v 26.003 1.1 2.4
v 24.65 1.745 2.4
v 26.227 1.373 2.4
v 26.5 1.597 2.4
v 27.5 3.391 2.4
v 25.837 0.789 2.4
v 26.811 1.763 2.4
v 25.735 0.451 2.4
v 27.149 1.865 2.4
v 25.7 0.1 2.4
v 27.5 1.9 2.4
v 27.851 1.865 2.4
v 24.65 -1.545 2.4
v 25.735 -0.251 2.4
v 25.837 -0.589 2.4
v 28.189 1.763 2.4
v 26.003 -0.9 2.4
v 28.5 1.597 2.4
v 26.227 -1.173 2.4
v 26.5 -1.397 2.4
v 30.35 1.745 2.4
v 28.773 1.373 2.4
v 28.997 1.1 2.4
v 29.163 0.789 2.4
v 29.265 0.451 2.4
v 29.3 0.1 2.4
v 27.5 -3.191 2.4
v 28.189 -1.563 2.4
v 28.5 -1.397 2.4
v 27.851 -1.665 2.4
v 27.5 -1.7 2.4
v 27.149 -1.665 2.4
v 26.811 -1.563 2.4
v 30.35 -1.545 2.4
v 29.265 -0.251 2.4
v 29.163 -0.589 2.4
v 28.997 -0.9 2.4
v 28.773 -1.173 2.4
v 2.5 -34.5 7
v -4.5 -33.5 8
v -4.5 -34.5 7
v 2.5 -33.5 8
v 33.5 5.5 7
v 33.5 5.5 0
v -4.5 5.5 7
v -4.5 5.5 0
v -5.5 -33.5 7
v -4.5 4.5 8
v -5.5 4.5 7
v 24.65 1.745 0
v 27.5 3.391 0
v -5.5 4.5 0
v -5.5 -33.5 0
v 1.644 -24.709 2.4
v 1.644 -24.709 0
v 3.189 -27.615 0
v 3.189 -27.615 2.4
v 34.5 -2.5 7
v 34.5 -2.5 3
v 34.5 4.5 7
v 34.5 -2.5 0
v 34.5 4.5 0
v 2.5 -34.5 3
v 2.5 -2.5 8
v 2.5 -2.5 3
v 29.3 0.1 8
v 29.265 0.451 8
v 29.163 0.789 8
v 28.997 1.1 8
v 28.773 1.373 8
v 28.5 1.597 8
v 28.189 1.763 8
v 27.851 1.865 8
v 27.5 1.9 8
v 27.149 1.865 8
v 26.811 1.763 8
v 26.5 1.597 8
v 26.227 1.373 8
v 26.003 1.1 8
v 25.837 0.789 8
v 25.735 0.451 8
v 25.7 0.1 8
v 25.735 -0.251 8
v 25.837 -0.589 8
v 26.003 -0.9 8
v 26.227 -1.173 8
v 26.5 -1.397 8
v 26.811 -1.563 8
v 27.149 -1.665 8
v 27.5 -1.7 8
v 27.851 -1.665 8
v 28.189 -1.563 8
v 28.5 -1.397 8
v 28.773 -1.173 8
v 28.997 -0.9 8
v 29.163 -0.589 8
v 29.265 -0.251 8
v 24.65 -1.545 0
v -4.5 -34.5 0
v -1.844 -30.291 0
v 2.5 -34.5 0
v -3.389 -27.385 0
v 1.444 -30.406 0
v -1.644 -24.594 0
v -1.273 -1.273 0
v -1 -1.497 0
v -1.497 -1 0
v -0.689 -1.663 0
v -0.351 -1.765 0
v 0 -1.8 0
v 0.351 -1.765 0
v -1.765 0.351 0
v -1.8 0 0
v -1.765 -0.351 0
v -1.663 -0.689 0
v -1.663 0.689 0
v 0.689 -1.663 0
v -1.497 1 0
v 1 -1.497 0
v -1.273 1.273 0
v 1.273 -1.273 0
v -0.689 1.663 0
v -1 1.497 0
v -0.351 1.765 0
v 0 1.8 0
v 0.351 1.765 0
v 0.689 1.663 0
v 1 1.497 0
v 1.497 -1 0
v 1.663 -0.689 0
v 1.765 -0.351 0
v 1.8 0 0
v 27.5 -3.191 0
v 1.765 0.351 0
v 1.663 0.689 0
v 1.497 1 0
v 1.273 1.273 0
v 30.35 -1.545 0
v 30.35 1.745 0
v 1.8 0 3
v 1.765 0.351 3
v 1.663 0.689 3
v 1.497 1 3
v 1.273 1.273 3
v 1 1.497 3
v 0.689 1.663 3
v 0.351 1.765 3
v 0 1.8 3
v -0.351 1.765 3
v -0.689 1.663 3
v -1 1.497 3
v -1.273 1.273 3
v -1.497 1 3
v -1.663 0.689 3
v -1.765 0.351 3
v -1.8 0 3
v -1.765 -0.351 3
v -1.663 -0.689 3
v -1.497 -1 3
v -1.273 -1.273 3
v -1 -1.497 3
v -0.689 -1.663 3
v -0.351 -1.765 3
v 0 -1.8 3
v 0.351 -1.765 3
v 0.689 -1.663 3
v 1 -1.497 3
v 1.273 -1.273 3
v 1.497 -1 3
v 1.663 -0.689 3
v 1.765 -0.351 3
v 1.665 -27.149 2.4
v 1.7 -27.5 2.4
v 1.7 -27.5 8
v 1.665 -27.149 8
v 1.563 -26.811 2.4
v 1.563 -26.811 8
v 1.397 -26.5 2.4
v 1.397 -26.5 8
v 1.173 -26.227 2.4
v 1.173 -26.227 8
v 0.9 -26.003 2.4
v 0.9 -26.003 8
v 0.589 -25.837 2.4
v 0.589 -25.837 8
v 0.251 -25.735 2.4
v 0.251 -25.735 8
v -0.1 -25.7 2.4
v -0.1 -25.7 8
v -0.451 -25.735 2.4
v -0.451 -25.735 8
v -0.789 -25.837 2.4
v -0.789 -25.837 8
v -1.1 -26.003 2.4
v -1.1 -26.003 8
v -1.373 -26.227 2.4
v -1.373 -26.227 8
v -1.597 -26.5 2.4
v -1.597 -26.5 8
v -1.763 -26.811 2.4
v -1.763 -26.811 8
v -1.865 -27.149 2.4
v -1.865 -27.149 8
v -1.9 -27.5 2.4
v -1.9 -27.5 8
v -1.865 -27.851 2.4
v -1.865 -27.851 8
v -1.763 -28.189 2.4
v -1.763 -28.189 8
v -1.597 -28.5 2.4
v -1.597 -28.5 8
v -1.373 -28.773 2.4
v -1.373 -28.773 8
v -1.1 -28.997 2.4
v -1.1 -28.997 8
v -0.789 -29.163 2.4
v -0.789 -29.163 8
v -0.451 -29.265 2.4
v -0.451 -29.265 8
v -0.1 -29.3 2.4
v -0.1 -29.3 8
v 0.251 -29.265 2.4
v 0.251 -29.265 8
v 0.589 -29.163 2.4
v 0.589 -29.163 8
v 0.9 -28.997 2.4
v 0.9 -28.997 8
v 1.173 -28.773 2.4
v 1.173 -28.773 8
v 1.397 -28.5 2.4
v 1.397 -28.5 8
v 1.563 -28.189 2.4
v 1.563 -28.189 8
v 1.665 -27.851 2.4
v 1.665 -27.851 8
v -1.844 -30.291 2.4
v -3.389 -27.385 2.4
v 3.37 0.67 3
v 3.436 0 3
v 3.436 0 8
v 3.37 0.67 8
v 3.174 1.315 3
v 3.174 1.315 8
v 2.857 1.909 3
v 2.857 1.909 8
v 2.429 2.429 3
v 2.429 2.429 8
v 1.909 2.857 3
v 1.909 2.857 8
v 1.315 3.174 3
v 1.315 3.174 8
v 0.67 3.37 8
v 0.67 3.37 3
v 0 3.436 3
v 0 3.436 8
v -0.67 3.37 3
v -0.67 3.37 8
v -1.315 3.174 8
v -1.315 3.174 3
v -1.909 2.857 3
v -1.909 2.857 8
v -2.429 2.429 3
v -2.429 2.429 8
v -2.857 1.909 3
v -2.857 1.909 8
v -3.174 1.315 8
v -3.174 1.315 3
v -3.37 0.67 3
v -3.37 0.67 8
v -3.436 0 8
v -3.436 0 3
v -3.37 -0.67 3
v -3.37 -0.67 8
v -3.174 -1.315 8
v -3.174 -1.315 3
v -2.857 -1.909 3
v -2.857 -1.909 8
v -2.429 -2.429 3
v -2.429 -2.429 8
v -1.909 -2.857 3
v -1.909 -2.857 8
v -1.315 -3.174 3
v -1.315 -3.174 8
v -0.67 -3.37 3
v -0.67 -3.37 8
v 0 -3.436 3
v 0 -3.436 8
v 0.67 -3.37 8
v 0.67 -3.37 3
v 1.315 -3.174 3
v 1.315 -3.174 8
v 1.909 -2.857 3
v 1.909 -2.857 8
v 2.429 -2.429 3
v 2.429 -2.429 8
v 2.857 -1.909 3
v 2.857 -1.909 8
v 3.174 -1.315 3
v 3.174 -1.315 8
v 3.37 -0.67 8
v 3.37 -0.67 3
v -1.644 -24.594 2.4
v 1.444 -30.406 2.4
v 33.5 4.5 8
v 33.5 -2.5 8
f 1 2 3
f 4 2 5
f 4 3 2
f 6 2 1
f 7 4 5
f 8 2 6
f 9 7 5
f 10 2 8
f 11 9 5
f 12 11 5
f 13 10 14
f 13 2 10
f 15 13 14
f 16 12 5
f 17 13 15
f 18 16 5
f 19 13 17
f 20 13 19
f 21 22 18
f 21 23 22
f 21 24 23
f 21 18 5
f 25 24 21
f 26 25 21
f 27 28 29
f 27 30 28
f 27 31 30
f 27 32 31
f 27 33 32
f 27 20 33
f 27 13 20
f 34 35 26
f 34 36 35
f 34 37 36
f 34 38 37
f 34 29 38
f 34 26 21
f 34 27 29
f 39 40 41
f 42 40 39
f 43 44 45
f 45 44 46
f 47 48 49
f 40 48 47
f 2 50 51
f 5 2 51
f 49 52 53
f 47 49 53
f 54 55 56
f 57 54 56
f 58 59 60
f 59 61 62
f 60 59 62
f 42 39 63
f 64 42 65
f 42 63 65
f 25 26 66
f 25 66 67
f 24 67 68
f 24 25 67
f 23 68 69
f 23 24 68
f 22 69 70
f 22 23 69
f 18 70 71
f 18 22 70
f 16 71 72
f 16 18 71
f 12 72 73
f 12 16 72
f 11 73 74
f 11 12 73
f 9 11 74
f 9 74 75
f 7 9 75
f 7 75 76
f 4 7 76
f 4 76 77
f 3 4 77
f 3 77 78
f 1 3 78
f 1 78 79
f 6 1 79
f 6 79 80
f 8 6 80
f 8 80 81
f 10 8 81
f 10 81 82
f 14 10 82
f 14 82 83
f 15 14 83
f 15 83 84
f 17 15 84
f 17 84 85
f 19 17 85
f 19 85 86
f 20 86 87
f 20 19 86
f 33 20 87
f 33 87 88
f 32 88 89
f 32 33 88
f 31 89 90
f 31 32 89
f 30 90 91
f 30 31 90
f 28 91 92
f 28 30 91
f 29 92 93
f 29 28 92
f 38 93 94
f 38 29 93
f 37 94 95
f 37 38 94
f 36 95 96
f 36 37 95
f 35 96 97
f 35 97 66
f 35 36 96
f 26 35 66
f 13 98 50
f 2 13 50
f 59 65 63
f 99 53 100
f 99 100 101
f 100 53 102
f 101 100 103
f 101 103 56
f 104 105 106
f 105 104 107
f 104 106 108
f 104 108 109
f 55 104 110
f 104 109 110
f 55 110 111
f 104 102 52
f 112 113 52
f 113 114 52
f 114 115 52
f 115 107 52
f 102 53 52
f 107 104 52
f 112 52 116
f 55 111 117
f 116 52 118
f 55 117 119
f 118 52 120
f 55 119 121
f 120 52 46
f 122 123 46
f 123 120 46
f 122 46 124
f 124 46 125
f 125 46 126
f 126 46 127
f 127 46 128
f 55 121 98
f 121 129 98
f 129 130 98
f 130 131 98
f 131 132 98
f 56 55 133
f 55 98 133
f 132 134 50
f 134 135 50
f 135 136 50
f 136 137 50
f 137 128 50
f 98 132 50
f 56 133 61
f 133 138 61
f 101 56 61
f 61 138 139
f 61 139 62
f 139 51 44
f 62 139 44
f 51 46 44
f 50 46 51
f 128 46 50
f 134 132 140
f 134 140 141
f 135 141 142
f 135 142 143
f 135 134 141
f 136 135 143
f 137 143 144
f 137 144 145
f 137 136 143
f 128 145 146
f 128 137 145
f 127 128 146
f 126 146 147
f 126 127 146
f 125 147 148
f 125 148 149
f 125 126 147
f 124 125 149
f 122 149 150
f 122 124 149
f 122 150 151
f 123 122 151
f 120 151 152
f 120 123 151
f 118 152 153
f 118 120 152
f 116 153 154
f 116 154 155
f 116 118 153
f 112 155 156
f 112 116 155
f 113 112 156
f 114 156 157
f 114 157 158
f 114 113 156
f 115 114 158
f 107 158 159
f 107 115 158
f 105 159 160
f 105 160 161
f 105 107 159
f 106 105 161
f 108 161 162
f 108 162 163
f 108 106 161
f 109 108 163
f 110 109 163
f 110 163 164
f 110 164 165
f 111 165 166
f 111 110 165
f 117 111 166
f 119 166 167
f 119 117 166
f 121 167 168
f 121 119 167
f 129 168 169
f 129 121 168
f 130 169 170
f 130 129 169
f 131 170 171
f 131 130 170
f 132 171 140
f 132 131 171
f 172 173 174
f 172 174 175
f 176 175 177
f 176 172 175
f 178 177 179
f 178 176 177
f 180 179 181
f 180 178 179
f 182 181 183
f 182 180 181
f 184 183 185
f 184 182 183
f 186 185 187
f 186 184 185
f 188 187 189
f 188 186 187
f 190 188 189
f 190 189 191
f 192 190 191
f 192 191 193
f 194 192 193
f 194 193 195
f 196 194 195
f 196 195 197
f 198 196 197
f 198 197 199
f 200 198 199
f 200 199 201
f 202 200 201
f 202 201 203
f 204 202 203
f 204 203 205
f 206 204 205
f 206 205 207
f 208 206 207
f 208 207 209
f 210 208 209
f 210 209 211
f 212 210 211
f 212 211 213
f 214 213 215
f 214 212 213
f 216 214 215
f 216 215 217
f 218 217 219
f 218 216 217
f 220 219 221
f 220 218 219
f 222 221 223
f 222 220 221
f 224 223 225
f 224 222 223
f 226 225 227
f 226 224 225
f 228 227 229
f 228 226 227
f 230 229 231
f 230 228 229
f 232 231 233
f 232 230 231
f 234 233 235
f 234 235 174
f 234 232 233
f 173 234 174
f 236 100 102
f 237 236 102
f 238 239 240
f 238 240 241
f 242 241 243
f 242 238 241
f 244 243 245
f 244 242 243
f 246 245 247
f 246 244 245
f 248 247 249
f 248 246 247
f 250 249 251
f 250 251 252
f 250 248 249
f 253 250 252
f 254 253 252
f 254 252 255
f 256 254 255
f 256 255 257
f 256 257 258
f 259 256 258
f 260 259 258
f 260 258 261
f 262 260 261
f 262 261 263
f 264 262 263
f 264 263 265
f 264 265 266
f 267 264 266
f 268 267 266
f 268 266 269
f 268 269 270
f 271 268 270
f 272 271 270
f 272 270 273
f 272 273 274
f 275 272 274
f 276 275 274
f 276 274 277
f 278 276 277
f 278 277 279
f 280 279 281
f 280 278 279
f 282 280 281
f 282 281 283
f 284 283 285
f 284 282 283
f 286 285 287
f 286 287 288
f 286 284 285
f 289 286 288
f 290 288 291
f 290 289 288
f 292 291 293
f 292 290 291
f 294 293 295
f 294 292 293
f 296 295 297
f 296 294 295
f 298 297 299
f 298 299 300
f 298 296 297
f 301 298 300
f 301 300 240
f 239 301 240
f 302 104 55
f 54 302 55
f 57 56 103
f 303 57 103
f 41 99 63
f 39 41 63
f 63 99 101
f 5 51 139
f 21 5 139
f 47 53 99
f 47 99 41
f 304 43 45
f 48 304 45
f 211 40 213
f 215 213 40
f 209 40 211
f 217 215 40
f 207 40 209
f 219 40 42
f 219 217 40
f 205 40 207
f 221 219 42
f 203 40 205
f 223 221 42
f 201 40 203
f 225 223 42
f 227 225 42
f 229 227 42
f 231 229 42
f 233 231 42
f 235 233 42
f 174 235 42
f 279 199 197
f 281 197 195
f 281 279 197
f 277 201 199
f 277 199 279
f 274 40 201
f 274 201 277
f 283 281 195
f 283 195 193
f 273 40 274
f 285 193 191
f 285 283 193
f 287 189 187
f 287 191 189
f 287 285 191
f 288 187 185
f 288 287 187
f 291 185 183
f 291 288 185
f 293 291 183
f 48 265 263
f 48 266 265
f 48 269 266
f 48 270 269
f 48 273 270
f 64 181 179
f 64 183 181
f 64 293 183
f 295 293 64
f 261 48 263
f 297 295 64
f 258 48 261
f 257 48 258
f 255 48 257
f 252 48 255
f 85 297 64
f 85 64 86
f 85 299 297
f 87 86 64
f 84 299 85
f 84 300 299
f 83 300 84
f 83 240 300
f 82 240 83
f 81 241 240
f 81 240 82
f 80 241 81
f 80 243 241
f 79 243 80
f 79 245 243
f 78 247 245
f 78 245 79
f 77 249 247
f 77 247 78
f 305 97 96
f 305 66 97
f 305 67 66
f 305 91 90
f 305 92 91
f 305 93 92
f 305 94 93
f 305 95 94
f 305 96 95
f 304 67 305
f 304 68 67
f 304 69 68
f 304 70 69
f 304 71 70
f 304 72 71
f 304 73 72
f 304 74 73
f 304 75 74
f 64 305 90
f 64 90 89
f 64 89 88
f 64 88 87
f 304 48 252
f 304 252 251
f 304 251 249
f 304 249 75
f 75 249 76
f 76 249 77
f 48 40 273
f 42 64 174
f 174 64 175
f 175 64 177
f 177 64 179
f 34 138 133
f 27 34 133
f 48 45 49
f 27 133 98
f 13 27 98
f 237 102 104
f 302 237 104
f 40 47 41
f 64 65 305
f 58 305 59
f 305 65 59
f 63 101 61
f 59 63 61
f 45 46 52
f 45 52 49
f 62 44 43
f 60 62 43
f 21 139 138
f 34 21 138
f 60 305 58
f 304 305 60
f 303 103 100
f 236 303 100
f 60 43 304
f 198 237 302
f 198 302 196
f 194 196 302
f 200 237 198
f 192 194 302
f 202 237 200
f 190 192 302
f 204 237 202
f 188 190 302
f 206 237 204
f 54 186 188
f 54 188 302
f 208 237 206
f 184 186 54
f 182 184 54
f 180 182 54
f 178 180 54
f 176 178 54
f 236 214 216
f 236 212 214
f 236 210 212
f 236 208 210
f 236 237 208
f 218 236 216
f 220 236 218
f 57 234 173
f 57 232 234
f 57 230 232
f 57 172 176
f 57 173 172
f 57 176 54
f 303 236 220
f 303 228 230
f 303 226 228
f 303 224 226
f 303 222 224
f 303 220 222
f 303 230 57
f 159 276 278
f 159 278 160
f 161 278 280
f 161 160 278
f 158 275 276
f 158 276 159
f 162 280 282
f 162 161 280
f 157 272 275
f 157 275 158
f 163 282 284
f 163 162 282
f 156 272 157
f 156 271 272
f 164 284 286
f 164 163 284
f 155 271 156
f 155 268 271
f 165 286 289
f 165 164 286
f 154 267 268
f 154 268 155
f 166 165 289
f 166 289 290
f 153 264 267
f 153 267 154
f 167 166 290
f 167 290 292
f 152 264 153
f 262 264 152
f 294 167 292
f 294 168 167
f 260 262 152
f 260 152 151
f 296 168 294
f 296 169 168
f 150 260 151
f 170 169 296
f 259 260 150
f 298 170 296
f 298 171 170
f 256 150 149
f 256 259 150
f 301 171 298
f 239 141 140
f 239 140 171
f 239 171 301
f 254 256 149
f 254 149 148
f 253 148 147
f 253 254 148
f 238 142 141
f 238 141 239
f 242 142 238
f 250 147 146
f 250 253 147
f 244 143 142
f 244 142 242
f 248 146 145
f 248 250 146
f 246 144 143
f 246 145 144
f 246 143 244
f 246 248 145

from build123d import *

# Parameters (mm, degrees)
F0_R     = 1.8
F0_R_2   = 3.435534
F1_DEPTH = 8
F2_DEPTH = 3
F3_R     = 1.8
F4_DEPTH = 2.4
F5_SIZE  = 1


with BuildPart() as f1:
    # F0 (on Top) → F1 (new body)
    with BuildSketch(Plane.XY):
        Polygon((34.5, 5.5), (-5.5, 5.5), (-5.5, -34.5), (2.5, -34.5), (2.5, -2.5), (34.5, -2.5), align=None)
        with Locations((-0.1, -27.5)):
            Circle(F0_R, mode=Mode.SUBTRACT)
        Circle(F0_R_2, mode=Mode.SUBTRACT)
        with Locations((27.5, 0.1)):
            Circle(F0_R, mode=Mode.SUBTRACT)
    extrude(amount=F1_DEPTH)

    # F0 (on Top) → F2 (join)
    with BuildSketch(Plane.XY):
        Polygon((2.5, -34.5), (34.5, -2.5), (2.5, -2.5), align=None)
        Circle(F0_R_2)
        Circle(F0_R, mode=Mode.SUBTRACT)
    extrude(amount=F2_DEPTH)

    # F3 (on face) → F4 (cut)
    with BuildSketch(Plane(origin=(0, 0, 0), x_dir=(1, 0, 0), z_dir=(0, 0, -1))):
        Polygon((-1.644435, 24.59402), (1.644435, 24.70949), (3.18887, 27.61547), (1.444435, 30.40598), (-1.844435, 30.29051), (-3.38887, 27.38453), align=None)
        with Locations((-0.1, 27.5)):
            Circle(F3_R, mode=Mode.SUBTRACT)
        Polygon((24.65, 1.545448), (24.65, -1.745448), (27.5, -3.390897), (30.35, -1.745448), (30.35, 1.545448), (27.5, 3.190897), align=None)
        with Locations((27.5, -0.1)):
            Circle(F3_R, mode=Mode.SUBTRACT)
    extrude(amount=-F4_DEPTH, mode=Mode.SUBTRACT)

    # F5
    f5_edges = [f1.edges().sort_by_distance(p)[0] for p in [
        (-5.5, 5.5, 4),
        (-5.5, -34.5, 4),
        (34.5, 5.5, 4),
        (14.5, 5.5, 8),
        (-5.5, -14.5, 8),
        (-1.5, -34.5, 8),
        (34.5, 1.5, 8),
    ]]
    chamfer(f5_edges, length=F5_SIZE)


solid = f1.part
